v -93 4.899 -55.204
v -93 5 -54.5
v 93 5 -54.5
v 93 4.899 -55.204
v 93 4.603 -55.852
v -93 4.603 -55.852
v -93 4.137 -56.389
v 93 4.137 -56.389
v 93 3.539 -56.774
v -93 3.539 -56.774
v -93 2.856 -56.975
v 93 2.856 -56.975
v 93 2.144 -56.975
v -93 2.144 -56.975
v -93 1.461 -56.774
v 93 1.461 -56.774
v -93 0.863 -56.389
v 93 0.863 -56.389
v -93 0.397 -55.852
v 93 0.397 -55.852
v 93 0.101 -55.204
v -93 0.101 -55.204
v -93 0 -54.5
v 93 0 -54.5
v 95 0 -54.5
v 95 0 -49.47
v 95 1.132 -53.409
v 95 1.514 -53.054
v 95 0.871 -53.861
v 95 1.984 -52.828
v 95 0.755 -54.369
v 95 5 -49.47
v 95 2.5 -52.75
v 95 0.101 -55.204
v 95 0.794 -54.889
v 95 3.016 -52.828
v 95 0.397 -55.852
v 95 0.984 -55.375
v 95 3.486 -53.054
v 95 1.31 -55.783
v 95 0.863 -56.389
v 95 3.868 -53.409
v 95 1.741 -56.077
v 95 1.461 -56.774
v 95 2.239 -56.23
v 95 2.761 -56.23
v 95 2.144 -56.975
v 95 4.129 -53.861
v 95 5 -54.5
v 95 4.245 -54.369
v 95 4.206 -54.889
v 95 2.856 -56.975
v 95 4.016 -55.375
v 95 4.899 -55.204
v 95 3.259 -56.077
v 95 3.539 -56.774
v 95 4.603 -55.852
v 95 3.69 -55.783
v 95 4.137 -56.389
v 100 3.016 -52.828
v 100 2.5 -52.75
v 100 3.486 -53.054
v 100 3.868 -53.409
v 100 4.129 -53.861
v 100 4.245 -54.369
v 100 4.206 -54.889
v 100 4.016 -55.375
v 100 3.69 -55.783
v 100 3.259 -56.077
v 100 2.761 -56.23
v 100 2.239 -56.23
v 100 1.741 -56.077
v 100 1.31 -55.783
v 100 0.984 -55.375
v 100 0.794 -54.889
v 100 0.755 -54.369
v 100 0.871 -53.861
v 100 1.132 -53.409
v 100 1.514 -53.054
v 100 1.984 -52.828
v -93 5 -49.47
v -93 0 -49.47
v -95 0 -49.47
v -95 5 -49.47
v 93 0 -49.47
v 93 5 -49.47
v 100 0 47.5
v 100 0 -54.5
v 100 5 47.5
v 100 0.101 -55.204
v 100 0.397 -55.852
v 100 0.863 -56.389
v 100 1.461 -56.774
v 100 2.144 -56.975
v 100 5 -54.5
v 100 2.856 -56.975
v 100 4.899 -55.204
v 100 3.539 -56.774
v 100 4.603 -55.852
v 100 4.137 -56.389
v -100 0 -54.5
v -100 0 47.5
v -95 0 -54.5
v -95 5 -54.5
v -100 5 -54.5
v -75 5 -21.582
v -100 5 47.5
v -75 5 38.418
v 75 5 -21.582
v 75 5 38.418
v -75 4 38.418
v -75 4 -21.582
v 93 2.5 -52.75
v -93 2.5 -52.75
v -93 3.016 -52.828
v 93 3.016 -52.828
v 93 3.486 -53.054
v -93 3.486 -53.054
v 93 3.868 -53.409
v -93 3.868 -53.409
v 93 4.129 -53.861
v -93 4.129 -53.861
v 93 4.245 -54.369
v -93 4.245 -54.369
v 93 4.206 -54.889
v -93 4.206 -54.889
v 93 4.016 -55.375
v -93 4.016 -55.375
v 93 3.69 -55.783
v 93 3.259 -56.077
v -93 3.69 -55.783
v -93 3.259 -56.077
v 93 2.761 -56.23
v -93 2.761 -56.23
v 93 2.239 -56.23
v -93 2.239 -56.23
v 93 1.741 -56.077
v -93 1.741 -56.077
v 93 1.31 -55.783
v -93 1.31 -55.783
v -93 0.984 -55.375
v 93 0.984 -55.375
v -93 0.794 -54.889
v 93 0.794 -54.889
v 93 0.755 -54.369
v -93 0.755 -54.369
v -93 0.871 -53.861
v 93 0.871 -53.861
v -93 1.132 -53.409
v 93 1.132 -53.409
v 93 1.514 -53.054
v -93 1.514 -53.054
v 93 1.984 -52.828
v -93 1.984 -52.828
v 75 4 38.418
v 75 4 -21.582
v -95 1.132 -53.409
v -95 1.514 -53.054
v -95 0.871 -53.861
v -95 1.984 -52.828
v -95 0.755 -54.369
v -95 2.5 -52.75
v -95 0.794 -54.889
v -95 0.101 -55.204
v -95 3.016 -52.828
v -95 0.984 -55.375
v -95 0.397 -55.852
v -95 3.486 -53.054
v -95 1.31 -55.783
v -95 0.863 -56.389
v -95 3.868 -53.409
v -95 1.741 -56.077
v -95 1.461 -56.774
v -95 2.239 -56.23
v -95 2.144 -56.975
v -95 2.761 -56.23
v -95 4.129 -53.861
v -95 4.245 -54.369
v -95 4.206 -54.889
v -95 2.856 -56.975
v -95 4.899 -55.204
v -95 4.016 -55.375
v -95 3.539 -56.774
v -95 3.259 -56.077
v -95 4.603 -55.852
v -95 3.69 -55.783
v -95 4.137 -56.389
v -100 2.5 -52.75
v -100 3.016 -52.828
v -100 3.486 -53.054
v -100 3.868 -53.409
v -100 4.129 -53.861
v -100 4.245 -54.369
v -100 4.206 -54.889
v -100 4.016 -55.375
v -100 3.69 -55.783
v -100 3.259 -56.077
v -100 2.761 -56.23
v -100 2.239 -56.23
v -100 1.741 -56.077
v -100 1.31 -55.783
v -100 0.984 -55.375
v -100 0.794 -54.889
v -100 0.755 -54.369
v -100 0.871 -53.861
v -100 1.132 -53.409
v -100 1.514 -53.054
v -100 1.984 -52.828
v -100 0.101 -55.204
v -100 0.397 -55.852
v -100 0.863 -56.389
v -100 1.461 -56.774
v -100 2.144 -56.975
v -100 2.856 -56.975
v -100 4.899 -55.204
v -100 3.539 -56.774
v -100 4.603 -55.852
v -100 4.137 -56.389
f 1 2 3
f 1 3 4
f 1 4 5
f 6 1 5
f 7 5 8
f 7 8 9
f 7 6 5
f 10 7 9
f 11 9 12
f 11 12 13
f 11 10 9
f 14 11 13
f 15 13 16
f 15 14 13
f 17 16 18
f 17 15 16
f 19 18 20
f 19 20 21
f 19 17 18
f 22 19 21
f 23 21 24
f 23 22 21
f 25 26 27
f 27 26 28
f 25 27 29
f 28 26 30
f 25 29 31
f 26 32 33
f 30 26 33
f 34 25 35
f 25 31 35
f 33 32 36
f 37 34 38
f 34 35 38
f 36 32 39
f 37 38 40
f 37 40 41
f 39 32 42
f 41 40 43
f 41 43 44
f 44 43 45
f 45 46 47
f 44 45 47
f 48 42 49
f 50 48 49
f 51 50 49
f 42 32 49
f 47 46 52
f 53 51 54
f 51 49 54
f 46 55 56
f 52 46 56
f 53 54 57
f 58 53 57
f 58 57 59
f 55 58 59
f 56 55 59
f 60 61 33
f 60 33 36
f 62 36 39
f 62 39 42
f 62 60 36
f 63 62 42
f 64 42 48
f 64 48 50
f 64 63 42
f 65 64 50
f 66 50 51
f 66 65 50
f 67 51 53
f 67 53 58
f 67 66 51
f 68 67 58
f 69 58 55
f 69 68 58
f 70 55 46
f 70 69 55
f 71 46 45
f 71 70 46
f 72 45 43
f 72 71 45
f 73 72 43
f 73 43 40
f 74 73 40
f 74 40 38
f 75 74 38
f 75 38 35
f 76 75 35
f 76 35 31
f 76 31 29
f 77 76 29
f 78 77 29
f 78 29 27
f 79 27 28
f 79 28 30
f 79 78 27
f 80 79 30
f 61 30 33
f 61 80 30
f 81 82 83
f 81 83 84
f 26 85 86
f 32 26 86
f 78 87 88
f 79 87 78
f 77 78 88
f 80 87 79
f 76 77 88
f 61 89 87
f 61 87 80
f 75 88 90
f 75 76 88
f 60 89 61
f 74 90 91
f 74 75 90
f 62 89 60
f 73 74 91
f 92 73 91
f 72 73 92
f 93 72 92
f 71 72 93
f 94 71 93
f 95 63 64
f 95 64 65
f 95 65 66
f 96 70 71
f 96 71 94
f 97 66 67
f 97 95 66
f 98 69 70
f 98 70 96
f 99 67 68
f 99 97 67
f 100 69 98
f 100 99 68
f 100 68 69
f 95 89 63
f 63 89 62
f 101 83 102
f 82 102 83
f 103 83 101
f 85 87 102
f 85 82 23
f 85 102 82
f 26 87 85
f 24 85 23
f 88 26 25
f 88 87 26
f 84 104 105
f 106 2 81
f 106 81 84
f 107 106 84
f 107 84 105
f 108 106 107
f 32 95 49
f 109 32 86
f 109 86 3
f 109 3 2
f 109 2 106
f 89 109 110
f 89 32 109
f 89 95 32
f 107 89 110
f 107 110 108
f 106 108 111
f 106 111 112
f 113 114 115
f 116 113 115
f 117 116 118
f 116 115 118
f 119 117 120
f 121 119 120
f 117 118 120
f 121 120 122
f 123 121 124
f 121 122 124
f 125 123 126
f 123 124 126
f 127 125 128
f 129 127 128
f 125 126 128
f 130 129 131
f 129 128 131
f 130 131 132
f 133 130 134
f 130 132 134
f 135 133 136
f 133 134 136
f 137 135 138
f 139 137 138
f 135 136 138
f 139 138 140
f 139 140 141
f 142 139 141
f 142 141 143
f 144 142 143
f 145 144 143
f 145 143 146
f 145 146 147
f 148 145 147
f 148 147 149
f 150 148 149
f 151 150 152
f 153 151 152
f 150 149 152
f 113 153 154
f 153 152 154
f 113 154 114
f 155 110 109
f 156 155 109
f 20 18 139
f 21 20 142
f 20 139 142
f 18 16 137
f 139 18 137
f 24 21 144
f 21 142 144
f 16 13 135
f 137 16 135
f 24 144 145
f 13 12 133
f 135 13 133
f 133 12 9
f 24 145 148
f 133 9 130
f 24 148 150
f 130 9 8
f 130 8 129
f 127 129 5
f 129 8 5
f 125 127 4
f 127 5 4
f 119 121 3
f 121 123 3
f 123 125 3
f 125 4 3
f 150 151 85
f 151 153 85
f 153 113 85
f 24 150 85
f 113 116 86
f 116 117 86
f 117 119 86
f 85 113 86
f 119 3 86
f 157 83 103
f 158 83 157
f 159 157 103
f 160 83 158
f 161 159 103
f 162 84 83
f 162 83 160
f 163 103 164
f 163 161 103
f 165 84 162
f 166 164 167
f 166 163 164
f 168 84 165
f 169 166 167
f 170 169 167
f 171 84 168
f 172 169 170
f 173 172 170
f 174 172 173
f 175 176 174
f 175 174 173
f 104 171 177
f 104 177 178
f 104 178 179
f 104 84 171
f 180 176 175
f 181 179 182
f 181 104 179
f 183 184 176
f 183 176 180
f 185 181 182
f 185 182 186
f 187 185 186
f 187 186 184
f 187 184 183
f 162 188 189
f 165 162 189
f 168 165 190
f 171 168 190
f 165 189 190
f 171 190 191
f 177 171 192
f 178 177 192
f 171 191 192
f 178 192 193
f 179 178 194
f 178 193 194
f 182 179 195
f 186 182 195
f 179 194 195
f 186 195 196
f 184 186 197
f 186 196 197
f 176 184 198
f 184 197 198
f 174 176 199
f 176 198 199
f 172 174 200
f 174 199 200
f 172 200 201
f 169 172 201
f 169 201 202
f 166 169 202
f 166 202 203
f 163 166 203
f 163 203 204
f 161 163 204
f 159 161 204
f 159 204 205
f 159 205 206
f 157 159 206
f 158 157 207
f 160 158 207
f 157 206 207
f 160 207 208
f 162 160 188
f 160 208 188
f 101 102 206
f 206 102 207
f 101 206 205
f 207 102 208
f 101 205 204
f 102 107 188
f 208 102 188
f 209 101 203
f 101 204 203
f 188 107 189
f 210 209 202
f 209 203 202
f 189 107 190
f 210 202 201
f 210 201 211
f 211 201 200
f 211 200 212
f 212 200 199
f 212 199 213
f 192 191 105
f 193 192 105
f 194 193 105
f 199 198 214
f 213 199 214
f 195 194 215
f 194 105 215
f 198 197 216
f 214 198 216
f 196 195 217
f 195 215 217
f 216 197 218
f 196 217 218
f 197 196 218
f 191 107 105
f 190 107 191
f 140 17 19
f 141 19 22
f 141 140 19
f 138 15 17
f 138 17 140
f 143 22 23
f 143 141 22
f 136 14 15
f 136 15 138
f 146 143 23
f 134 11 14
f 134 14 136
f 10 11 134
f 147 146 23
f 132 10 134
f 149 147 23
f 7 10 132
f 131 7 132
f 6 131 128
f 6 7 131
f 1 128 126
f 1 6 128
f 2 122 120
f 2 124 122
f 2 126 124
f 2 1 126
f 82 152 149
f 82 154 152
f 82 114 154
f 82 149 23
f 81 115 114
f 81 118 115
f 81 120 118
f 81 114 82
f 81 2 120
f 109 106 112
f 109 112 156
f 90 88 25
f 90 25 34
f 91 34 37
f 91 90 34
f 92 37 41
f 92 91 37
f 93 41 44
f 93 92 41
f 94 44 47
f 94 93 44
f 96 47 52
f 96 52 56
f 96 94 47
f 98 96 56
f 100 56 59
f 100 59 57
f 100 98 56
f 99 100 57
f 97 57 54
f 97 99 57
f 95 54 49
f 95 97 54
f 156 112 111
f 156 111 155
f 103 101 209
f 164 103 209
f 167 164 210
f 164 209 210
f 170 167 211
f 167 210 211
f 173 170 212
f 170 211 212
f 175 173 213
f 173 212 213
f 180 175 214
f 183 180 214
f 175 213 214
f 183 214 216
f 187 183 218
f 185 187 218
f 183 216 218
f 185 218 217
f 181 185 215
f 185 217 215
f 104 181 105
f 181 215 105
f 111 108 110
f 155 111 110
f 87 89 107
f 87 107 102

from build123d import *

# Parameters (mm, degrees)
SKETCH1_W           = 186
SKETCH1_H           = 95
BOSS_EXTRUDE1_DEPTH = 5
SKETCH2_W           = 150
SKETCH2_H           = 60
CUT_EXTRUDE1_DEPTH  = 1
SKETCH4_R           = 1.75
BOSS_EXTRUDE2_DEPTH = 186
SKETCH6_W           = 96.969797672
SKETCH6_H           = 5
BOSS_EXTRUDE3_DEPTH = 2
BOSS_EXTRUDE4_START = 5
SKETCH7_R           = 1.75
BOSS_EXTRUDE4_DEPTH = 5


with BuildPart() as part:
    # Sketch1 → Boss-Extrude1 (new body)
    with BuildSketch(Plane(origin=(0, 0, 0), x_dir=(1, 0, 0), z_dir=(0, 1, 0))):
        Rectangle(SKETCH1_W, SKETCH1_H)
    extrude(amount=BOSS_EXTRUDE1_DEPTH)

    # Sketch2 → Cut-Extrude1 (cut)
    with BuildSketch(Plane(origin=(0, 5, 0), x_dir=(1, 0, 0), z_dir=(0, 1, 0))):
        with Locations((0, -8.418340883)):
            Rectangle(SKETCH2_W, SKETCH2_H)
    extrude(amount=-CUT_EXTRUDE1_DEPTH, mode=Mode.SUBTRACT)

    # Sketch4 → Boss-Extrude2 (add, through all)
    with BuildSketch(Plane.ZY.offset(93)):
        with BuildLine():
            Line((-47.5, 0), (-47.5, 5))
            Line((-47.5, 5), (-54.5, 5))
            ThreePointArc((-54.5, 5), (-57, 2.5), (-54.5, 0))
            Line((-54.5, 0), (-47.5, 0))
        make_face()
        with Locations((-54.5, 2.5)):
            Circle(SKETCH4_R, mode=Mode.SUBTRACT)
    extrude(amount=-BOSS_EXTRUDE2_DEPTH)

    # Sketch6 → Boss-Extrude3 (add)
    with BuildSketch(Plane.ZY.offset(93)):
        with Locations((-0.984898836, 2.5)):
            Rectangle(SKETCH6_W, SKETCH6_H)
    boss_extrude3 = extrude(amount=BOSS_EXTRUDE3_DEPTH)

    # Mirror2: Boss-Extrude3 across plane
    add(boss_extrude3.mirror(Plane.ZY))

    # Sketch7 → Boss-Extrude4 (add)
    with BuildSketch(Plane.ZY.offset(95).offset(BOSS_EXTRUDE4_START)):
        with BuildLine():
            Line((-54.5, 5), (47.5, 5))
            Line((47.5, 5), (47.5, 0))
            Line((47.5, 0), (-54.5, 0))
            ThreePointArc((-54.5, 0), (-57, 2.5), (-54.5, 5))
        make_face()
        with Locations((-54.5, 2.5)):
            Circle(SKETCH7_R, mode=Mode.SUBTRACT)
    boss_extrude4 = extrude(amount=-BOSS_EXTRUDE4_DEPTH)

    # Mirror3: Boss-Extrude4 across plane
    add(boss_extrude4.mirror(Plane.ZY))


solid = part.part
